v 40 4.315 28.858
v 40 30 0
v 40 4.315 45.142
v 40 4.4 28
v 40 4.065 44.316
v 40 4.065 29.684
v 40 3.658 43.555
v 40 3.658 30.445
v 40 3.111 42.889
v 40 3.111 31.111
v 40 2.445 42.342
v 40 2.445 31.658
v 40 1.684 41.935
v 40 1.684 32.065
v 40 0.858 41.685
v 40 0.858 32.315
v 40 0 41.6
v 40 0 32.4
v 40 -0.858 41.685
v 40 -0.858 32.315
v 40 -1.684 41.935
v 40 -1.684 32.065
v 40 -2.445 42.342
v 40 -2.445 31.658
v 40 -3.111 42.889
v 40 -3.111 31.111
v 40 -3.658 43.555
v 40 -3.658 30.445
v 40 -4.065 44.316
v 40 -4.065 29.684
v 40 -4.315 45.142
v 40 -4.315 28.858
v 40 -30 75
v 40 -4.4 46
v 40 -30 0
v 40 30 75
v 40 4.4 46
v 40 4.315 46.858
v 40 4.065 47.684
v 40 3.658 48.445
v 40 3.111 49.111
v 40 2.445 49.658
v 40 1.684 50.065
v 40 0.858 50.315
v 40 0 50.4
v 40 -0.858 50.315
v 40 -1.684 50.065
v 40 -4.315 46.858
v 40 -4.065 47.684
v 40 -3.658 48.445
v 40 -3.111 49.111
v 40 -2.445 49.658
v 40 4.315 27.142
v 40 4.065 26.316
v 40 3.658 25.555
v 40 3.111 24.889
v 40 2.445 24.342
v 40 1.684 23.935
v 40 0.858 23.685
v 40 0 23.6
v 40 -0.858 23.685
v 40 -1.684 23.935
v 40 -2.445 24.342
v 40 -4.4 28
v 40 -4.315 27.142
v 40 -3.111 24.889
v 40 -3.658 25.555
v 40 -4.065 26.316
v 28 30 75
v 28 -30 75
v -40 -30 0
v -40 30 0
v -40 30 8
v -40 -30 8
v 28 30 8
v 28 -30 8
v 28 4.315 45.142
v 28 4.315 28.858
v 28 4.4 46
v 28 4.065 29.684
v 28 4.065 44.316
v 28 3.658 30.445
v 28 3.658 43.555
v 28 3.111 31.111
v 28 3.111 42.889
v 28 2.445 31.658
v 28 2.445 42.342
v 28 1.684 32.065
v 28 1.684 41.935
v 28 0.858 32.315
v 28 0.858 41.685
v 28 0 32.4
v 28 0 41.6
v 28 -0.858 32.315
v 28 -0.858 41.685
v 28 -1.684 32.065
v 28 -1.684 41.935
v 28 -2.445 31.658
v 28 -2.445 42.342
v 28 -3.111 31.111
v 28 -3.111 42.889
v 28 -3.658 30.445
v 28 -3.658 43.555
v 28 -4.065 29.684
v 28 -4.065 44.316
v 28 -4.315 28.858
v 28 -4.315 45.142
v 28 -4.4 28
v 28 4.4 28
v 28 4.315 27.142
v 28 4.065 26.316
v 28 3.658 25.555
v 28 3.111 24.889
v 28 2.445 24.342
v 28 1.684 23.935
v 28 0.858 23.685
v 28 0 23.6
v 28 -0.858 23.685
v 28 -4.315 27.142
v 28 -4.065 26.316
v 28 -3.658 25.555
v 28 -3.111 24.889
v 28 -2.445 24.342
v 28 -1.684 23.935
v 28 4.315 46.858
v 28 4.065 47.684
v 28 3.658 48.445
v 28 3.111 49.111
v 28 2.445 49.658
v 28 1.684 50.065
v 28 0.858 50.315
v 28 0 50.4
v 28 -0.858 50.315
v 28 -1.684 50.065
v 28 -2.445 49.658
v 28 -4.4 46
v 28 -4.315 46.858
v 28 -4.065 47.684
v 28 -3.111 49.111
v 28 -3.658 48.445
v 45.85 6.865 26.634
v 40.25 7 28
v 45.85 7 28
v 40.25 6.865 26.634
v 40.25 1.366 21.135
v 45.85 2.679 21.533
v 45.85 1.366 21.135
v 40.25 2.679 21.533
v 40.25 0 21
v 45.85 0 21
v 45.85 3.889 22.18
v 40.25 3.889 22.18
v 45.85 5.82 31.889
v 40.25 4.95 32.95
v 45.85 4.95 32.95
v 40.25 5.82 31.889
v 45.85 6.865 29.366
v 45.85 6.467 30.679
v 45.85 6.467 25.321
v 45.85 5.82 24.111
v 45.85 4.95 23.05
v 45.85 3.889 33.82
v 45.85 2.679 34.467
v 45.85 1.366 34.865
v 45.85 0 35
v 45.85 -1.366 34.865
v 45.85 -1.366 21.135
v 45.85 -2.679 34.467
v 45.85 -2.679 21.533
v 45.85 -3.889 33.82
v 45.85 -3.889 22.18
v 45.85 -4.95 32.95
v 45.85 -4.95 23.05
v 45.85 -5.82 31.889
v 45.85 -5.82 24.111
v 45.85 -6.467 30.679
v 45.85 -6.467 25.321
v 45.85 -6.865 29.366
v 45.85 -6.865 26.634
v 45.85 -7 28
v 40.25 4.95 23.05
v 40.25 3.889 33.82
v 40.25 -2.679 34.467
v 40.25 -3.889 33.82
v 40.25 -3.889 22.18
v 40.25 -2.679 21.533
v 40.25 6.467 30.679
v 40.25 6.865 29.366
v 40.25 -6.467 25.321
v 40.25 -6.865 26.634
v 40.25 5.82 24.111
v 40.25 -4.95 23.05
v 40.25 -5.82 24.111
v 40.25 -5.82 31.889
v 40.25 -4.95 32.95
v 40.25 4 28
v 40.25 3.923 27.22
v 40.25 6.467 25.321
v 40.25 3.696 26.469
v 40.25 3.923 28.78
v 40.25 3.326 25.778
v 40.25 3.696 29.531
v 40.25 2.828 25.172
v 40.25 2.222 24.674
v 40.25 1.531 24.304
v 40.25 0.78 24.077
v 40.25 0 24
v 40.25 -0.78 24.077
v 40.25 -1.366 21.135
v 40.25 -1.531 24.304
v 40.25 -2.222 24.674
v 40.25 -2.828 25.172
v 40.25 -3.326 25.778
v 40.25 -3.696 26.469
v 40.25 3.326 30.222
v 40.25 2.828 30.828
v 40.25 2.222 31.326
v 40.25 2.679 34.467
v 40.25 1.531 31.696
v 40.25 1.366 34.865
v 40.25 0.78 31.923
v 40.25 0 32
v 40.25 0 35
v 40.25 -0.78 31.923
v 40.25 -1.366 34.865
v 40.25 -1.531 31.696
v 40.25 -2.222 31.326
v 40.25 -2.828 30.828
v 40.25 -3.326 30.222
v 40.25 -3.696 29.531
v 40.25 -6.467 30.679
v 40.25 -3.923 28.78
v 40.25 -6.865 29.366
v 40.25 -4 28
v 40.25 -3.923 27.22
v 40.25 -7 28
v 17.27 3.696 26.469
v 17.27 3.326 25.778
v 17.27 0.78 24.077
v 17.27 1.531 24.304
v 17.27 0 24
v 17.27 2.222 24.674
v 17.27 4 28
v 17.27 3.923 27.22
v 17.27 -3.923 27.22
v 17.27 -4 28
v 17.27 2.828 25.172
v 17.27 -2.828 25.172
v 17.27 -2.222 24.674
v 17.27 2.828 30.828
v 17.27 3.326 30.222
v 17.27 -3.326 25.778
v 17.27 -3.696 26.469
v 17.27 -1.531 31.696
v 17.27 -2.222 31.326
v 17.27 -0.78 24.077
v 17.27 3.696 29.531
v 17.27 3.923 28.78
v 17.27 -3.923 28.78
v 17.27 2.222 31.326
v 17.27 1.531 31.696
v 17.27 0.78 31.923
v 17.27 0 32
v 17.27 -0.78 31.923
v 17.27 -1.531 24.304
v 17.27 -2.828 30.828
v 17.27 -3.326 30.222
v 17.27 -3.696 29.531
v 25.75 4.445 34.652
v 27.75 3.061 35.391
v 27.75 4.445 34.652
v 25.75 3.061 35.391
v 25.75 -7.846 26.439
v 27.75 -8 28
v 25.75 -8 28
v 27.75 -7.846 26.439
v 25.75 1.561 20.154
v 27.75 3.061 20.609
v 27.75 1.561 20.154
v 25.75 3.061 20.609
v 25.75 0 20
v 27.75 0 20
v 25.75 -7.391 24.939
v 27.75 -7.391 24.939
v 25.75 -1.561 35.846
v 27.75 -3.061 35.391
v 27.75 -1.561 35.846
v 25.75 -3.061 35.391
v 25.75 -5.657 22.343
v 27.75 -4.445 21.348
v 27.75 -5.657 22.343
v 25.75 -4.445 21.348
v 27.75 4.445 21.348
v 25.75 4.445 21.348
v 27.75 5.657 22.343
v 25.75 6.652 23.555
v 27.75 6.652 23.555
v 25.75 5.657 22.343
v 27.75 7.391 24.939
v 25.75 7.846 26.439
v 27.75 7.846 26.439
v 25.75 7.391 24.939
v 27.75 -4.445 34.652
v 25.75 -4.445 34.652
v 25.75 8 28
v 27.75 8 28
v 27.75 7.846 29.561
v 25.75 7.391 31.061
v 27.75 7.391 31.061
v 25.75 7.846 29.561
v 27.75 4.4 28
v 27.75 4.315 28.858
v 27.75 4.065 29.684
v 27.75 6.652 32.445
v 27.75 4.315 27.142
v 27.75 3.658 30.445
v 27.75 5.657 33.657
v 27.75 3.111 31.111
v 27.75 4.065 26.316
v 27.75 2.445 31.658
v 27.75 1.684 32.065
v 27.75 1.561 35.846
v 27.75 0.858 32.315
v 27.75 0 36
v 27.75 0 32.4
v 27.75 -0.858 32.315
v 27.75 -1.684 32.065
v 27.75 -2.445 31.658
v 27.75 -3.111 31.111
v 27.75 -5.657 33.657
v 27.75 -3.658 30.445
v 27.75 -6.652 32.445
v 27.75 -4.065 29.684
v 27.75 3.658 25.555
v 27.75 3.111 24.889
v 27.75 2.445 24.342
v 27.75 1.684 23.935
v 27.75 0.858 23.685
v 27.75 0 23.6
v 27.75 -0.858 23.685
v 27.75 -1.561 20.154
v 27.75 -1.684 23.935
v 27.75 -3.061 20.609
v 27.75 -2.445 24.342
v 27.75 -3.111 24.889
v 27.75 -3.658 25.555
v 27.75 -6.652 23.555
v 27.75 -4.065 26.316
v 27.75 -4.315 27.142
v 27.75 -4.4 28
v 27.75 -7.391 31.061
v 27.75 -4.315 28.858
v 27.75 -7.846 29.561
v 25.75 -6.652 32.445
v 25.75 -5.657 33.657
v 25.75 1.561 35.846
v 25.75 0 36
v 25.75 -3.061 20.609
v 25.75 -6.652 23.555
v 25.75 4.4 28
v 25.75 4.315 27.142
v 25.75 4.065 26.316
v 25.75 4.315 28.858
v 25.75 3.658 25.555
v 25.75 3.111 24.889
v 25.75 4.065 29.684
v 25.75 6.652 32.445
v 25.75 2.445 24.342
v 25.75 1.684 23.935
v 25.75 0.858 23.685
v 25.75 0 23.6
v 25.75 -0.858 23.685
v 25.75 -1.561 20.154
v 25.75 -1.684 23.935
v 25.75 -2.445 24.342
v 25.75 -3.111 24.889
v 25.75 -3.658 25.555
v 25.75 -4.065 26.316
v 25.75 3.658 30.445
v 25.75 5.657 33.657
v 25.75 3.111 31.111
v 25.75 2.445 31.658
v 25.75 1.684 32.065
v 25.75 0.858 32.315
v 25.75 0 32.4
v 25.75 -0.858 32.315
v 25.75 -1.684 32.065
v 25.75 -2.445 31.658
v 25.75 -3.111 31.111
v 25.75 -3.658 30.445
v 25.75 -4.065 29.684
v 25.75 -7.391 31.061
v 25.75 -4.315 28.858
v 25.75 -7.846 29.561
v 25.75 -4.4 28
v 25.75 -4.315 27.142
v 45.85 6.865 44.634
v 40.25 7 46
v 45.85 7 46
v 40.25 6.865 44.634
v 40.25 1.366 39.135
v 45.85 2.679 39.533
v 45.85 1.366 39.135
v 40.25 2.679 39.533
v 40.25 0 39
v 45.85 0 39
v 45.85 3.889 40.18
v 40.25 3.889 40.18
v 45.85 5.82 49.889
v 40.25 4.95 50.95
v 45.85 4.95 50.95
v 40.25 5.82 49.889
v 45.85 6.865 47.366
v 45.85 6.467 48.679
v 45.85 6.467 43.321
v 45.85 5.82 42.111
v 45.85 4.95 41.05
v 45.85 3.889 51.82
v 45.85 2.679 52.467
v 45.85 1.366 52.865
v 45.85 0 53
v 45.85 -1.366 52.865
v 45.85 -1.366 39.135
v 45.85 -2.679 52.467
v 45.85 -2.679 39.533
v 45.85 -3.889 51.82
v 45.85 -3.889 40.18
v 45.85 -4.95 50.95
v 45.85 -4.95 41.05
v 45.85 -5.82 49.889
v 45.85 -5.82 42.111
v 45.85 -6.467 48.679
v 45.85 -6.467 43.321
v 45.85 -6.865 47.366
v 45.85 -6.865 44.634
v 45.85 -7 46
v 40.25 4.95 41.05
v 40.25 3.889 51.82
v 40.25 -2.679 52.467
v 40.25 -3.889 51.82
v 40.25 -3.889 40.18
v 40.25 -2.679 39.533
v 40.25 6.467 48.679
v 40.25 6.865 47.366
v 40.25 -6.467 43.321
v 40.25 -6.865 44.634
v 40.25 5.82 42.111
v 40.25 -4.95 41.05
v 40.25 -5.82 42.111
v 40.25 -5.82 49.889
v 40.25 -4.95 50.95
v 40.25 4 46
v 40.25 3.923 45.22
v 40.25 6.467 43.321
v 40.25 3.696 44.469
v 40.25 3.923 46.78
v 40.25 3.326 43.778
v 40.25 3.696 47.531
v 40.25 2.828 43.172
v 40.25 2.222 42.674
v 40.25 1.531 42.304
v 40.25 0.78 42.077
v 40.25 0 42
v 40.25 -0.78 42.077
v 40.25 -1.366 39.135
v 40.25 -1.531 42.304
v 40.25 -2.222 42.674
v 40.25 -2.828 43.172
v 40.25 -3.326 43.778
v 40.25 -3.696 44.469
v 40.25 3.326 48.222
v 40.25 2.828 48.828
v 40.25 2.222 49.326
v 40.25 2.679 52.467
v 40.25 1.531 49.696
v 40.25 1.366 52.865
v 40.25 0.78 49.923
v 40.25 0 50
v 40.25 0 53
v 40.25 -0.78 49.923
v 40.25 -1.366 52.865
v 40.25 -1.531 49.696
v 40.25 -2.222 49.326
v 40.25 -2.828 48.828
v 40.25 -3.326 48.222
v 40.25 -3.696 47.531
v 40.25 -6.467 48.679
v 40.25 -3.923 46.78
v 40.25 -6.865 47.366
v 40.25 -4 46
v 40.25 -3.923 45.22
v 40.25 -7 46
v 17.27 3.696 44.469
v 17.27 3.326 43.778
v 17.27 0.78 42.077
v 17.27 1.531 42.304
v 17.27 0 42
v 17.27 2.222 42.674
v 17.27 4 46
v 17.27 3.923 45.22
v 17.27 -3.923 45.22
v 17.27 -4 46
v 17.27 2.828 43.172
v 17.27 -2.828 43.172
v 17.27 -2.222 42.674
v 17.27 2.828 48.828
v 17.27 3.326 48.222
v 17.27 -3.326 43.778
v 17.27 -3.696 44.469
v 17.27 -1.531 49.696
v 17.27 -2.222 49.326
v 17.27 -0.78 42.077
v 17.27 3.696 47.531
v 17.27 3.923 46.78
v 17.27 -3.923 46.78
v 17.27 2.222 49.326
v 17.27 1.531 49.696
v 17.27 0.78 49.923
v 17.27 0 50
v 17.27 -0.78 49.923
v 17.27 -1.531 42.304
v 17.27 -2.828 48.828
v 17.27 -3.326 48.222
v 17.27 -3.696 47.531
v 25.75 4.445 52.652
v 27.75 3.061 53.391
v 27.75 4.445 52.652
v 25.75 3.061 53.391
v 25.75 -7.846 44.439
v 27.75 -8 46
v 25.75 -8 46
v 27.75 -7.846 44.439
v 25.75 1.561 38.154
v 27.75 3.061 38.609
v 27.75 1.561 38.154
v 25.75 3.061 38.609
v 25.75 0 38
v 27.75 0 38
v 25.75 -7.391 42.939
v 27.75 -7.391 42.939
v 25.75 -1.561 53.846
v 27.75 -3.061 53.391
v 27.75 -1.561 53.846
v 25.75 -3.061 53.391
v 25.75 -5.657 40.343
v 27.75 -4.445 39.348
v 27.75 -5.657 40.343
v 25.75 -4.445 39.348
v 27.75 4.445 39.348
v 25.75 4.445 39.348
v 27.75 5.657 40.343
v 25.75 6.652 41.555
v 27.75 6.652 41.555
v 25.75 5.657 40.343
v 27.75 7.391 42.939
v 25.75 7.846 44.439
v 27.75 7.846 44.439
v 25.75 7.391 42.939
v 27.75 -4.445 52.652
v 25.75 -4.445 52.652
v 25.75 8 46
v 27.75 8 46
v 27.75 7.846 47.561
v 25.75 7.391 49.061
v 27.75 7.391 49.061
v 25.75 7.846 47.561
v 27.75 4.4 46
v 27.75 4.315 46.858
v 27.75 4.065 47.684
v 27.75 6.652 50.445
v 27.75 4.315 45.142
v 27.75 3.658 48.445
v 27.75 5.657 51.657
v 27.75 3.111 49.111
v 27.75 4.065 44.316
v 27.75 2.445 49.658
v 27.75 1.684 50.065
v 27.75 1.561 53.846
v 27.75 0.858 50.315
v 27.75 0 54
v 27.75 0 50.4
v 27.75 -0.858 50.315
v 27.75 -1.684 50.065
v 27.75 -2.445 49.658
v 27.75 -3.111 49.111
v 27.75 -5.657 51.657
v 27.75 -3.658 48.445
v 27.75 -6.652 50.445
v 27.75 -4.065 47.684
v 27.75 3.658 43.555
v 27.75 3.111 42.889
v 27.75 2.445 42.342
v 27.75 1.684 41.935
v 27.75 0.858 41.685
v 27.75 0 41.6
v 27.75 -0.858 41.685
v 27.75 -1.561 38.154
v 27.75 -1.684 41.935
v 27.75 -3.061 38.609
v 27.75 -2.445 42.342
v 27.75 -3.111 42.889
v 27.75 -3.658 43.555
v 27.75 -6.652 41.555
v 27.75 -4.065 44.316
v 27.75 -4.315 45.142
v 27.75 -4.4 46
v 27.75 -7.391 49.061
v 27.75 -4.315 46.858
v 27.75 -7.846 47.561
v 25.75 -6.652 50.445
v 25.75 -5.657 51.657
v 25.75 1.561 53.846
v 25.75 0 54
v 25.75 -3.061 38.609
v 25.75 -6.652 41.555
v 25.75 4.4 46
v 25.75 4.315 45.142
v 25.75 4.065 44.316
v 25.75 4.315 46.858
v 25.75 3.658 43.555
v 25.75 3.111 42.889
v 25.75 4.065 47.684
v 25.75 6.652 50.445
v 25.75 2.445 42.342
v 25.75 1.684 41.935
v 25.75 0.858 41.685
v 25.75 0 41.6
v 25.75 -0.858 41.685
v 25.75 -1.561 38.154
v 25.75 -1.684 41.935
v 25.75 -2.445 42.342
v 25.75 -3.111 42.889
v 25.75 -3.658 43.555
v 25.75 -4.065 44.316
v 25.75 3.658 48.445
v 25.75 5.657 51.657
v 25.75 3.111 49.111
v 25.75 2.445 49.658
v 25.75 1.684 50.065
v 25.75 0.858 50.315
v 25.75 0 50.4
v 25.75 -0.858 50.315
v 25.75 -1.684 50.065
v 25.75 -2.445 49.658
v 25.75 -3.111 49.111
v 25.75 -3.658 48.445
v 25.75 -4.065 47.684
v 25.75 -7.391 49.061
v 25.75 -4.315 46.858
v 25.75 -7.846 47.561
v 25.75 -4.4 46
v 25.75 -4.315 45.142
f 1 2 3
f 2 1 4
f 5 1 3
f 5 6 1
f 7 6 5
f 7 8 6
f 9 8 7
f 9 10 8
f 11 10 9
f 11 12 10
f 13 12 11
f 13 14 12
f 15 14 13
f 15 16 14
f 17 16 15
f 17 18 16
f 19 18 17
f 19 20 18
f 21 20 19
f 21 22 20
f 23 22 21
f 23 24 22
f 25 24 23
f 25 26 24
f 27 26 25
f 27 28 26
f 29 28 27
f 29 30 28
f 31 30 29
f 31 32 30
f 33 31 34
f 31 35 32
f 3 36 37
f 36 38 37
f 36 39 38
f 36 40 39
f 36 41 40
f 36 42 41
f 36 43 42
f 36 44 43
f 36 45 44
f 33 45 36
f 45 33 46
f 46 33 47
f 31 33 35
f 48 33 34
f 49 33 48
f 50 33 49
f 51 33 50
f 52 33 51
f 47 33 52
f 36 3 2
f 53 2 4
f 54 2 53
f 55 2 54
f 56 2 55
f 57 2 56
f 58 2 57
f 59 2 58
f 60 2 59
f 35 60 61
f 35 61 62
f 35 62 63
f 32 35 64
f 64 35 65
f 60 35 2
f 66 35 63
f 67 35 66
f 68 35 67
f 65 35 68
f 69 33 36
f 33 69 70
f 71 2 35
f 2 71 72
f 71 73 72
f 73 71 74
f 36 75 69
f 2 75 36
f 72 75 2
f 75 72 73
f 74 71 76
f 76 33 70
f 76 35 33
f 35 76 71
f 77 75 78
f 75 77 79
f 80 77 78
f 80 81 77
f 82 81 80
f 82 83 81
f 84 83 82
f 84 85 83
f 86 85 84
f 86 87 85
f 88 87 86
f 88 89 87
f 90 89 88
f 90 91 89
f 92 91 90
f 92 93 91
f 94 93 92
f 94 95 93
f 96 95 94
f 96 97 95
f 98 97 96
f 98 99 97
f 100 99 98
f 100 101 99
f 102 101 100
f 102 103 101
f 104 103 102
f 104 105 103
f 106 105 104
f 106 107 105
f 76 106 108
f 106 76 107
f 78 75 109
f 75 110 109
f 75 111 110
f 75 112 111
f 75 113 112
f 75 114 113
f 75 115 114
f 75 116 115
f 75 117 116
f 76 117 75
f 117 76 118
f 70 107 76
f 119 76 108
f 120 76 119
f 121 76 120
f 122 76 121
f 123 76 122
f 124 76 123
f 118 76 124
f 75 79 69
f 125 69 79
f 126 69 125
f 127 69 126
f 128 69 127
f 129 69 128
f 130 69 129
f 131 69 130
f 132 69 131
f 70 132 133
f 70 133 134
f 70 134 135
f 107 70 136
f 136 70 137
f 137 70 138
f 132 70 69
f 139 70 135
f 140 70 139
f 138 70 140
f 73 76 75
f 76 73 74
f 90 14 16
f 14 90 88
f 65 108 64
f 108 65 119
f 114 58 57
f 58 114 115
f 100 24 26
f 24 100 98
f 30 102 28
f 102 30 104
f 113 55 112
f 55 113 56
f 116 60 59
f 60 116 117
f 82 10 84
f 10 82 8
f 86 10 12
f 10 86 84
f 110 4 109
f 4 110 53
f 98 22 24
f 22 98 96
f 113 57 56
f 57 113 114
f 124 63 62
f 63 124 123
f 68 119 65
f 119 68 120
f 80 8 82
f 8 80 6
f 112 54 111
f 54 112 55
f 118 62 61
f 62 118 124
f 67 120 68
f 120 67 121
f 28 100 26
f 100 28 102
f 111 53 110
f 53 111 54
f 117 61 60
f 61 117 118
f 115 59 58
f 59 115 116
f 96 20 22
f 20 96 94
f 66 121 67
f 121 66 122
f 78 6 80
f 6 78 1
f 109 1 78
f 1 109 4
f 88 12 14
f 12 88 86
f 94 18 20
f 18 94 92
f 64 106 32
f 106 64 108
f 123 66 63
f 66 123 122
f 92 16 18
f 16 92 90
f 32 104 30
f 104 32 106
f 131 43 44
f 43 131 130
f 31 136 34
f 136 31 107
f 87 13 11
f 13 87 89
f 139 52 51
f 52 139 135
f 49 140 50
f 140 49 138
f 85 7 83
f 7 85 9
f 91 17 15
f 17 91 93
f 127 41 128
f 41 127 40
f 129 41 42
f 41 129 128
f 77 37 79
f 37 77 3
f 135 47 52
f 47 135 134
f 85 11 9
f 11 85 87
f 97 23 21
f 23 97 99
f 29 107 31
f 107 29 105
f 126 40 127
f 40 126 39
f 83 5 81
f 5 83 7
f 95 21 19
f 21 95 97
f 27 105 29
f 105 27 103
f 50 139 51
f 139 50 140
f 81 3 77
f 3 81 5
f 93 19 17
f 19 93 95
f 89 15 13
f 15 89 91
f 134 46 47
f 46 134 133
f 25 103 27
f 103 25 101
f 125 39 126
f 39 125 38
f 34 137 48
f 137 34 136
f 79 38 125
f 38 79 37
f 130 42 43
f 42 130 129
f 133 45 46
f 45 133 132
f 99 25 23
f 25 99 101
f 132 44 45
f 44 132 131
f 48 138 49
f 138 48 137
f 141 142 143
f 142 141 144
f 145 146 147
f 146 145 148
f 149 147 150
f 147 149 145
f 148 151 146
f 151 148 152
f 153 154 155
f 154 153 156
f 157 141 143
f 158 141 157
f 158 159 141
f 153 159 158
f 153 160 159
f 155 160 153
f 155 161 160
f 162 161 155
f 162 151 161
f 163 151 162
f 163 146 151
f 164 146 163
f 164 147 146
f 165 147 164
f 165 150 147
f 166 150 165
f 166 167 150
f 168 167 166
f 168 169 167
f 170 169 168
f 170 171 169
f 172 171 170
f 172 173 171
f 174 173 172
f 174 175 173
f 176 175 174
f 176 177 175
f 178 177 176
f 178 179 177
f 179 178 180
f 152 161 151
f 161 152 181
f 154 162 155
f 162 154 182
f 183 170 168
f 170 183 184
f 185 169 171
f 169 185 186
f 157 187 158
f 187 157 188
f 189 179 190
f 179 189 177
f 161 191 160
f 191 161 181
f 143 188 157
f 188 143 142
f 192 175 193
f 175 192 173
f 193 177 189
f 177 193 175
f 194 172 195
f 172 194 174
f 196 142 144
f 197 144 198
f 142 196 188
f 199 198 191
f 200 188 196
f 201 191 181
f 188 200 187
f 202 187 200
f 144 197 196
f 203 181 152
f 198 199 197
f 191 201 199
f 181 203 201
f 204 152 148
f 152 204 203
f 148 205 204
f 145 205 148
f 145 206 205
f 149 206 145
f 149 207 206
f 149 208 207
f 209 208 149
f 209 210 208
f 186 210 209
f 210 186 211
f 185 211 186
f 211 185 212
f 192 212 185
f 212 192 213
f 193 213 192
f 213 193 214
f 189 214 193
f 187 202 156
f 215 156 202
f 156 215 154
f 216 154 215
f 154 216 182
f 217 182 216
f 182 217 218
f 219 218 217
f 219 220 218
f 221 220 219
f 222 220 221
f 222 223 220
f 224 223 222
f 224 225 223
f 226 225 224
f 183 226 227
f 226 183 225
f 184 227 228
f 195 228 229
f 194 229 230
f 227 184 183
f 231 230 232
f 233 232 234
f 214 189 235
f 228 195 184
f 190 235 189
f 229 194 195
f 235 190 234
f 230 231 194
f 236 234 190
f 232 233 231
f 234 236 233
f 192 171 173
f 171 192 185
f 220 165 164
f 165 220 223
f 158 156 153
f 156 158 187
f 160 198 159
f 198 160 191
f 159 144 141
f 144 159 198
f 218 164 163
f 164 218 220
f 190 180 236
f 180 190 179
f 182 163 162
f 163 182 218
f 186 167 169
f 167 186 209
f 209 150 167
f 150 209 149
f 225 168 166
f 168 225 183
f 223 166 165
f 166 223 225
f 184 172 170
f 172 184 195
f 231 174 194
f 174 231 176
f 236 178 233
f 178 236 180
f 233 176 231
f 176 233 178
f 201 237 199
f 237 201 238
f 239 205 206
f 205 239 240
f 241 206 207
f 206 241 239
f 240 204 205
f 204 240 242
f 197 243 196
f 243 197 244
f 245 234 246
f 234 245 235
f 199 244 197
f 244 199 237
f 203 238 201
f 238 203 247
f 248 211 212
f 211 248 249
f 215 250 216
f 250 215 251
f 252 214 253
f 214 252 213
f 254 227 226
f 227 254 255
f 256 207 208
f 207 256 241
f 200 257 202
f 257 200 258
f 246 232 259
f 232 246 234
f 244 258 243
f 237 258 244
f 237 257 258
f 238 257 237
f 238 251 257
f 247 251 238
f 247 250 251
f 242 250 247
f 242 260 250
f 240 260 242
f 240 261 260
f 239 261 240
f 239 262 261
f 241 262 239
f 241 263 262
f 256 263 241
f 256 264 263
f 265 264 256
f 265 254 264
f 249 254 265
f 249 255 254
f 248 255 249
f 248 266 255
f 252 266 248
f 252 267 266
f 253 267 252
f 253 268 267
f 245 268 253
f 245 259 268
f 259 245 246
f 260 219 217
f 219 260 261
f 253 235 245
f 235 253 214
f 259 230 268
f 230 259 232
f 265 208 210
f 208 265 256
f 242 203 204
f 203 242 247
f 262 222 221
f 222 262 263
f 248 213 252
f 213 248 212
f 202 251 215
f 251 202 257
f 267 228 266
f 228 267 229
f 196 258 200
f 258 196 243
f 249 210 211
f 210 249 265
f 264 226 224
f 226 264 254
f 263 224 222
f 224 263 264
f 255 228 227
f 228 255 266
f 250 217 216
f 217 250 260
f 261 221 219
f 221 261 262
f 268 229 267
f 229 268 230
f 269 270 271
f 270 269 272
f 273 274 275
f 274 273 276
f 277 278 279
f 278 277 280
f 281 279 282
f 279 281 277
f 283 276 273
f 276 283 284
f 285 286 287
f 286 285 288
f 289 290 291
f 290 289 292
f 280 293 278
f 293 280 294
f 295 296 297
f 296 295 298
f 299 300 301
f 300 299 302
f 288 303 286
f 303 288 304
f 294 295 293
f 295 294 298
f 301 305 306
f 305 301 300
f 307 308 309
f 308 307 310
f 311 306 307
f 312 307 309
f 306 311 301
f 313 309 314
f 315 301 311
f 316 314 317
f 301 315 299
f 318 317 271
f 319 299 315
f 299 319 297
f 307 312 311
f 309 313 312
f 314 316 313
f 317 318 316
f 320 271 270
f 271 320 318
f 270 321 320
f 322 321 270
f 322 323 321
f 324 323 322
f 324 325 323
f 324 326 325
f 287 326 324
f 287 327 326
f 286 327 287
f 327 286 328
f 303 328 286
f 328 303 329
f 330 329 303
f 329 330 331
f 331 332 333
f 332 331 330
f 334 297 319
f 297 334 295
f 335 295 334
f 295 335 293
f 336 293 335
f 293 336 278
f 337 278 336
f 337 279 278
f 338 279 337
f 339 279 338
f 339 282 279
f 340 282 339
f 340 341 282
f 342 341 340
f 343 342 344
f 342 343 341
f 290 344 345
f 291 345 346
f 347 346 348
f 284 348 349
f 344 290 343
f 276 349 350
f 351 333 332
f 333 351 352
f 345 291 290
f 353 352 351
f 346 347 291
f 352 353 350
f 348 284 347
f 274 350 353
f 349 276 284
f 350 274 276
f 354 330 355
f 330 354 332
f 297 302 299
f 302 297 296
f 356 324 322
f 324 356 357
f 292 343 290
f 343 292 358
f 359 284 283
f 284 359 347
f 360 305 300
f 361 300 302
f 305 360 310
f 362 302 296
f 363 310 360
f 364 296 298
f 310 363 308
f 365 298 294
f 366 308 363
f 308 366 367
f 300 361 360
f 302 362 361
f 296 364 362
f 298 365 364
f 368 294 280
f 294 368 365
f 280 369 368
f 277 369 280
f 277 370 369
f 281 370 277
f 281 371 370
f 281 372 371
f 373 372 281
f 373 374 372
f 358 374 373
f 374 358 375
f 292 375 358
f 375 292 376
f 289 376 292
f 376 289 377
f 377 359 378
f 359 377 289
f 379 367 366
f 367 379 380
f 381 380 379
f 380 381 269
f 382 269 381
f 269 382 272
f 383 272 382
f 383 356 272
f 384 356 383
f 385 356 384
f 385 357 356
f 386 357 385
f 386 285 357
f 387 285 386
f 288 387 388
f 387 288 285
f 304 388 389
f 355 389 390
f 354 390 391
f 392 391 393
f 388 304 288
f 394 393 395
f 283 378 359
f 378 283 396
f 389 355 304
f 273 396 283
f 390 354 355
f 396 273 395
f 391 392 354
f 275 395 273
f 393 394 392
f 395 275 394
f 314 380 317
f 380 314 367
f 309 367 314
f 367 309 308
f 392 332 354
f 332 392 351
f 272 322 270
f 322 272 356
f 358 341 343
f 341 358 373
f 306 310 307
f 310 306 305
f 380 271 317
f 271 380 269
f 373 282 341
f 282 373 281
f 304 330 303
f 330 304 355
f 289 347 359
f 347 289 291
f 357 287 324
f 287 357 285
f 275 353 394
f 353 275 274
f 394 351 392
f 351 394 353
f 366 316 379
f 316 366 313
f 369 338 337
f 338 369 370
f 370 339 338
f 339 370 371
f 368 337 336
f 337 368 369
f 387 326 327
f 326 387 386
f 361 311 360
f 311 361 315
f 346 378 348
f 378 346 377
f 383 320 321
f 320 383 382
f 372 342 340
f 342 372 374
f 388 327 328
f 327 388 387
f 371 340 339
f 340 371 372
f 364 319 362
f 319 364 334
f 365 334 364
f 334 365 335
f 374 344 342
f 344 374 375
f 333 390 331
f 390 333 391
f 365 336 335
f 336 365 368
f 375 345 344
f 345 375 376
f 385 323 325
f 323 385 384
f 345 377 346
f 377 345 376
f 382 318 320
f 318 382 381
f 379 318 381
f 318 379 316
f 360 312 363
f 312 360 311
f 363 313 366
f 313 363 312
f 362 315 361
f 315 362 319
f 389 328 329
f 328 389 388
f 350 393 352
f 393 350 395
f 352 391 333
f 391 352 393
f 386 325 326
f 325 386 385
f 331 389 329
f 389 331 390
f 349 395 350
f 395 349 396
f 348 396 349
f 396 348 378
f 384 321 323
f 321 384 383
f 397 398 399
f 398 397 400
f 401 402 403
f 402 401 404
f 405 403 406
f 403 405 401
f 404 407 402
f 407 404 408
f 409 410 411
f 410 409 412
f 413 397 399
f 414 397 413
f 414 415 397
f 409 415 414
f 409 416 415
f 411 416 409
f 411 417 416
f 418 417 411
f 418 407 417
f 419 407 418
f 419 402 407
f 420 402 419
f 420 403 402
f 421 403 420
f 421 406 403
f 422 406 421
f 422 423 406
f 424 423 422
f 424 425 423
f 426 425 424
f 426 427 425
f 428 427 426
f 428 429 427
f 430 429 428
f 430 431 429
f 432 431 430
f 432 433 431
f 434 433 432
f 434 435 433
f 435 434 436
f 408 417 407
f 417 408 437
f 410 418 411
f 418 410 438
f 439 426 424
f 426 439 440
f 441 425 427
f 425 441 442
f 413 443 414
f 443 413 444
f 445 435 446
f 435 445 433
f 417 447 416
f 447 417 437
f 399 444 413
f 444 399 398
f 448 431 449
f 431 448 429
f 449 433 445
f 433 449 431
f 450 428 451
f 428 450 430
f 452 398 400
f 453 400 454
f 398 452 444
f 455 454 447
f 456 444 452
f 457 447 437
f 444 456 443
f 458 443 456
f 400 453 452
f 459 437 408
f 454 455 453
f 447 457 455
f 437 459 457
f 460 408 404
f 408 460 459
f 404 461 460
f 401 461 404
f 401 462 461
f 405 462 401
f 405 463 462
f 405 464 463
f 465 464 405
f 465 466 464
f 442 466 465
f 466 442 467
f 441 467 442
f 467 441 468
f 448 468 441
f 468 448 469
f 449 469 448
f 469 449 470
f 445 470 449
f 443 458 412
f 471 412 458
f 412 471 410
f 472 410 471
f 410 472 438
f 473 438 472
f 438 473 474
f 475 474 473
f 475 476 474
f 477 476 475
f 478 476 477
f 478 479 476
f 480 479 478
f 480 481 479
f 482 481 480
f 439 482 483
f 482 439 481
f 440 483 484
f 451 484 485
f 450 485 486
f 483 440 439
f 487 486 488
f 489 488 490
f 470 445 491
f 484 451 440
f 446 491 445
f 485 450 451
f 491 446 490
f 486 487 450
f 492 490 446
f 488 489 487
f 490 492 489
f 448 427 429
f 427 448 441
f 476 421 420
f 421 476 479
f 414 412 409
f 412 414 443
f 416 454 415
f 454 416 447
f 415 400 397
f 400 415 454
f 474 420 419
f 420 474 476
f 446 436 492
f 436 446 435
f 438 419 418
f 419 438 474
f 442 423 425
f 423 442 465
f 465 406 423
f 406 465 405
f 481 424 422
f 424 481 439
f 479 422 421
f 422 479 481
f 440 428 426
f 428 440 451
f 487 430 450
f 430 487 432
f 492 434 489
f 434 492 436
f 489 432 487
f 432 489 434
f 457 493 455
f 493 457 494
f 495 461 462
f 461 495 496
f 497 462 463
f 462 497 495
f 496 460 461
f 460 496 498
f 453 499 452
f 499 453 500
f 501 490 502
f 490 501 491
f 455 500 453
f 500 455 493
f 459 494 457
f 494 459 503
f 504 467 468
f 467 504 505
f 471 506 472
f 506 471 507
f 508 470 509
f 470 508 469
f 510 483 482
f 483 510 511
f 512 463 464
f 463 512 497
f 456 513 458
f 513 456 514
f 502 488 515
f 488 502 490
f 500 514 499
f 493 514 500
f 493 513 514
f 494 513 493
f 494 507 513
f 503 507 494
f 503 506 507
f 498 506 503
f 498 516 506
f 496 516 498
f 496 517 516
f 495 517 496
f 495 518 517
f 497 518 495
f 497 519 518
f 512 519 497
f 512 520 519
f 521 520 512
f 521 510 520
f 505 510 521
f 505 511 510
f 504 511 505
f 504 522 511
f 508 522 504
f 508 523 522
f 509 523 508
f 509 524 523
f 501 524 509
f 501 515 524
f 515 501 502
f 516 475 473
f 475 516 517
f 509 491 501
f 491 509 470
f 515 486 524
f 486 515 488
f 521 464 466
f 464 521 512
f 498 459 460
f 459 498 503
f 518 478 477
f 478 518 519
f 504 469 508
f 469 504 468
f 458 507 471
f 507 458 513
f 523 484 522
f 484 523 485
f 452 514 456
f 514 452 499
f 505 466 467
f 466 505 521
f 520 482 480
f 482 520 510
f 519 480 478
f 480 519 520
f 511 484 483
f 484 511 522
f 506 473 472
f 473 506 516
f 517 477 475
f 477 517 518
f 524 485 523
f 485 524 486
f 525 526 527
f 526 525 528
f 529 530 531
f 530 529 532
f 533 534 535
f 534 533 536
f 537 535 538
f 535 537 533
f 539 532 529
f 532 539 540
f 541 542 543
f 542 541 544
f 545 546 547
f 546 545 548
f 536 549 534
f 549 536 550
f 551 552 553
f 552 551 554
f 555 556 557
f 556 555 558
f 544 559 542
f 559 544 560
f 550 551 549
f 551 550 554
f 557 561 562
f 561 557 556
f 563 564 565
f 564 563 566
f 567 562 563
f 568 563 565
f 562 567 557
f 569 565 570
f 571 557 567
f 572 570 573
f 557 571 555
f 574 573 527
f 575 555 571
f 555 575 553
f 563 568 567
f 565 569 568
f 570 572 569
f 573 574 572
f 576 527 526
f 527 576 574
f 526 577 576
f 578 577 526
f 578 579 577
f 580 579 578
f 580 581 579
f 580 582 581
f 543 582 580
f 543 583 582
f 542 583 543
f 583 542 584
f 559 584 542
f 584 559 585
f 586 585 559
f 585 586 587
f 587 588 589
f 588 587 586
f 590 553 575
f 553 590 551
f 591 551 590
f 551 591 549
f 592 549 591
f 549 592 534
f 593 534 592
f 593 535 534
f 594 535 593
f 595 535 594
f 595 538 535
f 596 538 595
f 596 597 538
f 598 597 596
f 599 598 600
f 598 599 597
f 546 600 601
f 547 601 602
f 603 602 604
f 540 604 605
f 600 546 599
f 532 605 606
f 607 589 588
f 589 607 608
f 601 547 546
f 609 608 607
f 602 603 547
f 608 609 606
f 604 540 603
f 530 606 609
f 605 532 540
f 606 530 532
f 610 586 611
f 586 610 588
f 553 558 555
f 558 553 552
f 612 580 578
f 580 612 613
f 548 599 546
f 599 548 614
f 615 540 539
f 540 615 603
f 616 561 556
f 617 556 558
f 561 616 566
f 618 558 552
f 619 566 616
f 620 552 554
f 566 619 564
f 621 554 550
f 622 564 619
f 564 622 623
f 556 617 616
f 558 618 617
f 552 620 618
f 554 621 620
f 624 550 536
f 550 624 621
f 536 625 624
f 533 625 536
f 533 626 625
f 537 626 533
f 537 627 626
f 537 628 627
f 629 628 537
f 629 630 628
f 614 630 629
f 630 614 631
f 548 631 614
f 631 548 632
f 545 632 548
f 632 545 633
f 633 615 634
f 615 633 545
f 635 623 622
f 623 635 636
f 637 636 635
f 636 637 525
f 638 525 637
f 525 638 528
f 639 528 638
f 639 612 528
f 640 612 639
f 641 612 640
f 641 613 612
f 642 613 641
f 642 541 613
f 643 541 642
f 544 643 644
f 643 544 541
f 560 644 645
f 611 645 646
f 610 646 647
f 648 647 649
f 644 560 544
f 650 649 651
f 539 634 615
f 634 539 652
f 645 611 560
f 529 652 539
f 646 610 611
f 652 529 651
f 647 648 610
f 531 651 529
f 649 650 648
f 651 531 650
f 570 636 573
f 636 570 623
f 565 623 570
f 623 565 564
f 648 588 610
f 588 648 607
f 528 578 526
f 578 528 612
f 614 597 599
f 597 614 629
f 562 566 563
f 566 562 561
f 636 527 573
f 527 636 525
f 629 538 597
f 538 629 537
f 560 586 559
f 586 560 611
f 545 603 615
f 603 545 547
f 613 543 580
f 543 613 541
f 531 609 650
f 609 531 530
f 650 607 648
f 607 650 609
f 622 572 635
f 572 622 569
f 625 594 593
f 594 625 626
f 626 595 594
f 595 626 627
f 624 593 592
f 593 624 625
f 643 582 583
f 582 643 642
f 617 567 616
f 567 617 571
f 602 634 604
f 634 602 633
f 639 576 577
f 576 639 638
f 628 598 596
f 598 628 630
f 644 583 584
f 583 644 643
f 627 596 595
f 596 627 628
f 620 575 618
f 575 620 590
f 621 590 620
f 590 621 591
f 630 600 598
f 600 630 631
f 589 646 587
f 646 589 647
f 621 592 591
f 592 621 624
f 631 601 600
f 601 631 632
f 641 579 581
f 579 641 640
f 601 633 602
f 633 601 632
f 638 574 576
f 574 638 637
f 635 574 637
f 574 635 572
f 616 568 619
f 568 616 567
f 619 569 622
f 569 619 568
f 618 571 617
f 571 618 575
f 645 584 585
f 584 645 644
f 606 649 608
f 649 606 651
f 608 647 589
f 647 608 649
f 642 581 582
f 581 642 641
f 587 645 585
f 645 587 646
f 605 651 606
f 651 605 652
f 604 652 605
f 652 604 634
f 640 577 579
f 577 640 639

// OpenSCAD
$fn = 32;

// ------------------------------------------------------------------------
// Bolted bracket: 80 x 60 mm bracket with 2 bolt joints
// Every part is its own module, assembly() places them once.
// ------------------------------------------------------------------------

// --- part 1 ---
module bracket() {
  difference() {
    translate([-40, -30, 0]) cube([80, 60, 75]);
    translate([-41, -31, 8]) cube([69, 62, 68]);
    translate([34, 0, 28]) rotate([0, 90, 0]) cylinder(h = 14, d = 8.8, center = true);
    translate([34, 0, 46]) rotate([0, 90, 0]) cylinder(h = 14, d = 8.8, center = true);
  }
}

// --- part 2 ---
module bolt1() {
  cylinder(h = 5.6, d = 14);
  translate([0, 0, -22.98]) cylinder(h = 22.98, d = 8);
}

// --- part 3 ---
module washer1() {
  difference() {
      translate([0, 0, 0]) cylinder(h = 2, d = 16);
      translate([0, 0, -1]) cylinder(h = 4, d = 8.8);
    }
}

// --- part 4 ---
module bolt2() {
  cylinder(h = 5.6, d = 14);
  translate([0, 0, -22.98]) cylinder(h = 22.98, d = 8);
}

// --- part 5 ---
module washer2() {
  difference() {
      translate([0, 0, 0]) cylinder(h = 2, d = 16);
      translate([0, 0, -1]) cylinder(h = 4, d = 8.8);
    }
}

// --- assembly ---
module assembly() {
  translate([0, 0, 0]) rotate([0, 0, 0]) bracket();
  translate([40.25, 0, 28]) rotate([0, 90, 0]) bolt1();
  translate([25.75, 0, 28]) rotate([0, 90, 0]) washer1();
  translate([40.25, 0, 46]) rotate([0, 90, 0]) bolt2();
  translate([25.75, 0, 46]) rotate([0, 90, 0]) washer2();
}

assembly();
